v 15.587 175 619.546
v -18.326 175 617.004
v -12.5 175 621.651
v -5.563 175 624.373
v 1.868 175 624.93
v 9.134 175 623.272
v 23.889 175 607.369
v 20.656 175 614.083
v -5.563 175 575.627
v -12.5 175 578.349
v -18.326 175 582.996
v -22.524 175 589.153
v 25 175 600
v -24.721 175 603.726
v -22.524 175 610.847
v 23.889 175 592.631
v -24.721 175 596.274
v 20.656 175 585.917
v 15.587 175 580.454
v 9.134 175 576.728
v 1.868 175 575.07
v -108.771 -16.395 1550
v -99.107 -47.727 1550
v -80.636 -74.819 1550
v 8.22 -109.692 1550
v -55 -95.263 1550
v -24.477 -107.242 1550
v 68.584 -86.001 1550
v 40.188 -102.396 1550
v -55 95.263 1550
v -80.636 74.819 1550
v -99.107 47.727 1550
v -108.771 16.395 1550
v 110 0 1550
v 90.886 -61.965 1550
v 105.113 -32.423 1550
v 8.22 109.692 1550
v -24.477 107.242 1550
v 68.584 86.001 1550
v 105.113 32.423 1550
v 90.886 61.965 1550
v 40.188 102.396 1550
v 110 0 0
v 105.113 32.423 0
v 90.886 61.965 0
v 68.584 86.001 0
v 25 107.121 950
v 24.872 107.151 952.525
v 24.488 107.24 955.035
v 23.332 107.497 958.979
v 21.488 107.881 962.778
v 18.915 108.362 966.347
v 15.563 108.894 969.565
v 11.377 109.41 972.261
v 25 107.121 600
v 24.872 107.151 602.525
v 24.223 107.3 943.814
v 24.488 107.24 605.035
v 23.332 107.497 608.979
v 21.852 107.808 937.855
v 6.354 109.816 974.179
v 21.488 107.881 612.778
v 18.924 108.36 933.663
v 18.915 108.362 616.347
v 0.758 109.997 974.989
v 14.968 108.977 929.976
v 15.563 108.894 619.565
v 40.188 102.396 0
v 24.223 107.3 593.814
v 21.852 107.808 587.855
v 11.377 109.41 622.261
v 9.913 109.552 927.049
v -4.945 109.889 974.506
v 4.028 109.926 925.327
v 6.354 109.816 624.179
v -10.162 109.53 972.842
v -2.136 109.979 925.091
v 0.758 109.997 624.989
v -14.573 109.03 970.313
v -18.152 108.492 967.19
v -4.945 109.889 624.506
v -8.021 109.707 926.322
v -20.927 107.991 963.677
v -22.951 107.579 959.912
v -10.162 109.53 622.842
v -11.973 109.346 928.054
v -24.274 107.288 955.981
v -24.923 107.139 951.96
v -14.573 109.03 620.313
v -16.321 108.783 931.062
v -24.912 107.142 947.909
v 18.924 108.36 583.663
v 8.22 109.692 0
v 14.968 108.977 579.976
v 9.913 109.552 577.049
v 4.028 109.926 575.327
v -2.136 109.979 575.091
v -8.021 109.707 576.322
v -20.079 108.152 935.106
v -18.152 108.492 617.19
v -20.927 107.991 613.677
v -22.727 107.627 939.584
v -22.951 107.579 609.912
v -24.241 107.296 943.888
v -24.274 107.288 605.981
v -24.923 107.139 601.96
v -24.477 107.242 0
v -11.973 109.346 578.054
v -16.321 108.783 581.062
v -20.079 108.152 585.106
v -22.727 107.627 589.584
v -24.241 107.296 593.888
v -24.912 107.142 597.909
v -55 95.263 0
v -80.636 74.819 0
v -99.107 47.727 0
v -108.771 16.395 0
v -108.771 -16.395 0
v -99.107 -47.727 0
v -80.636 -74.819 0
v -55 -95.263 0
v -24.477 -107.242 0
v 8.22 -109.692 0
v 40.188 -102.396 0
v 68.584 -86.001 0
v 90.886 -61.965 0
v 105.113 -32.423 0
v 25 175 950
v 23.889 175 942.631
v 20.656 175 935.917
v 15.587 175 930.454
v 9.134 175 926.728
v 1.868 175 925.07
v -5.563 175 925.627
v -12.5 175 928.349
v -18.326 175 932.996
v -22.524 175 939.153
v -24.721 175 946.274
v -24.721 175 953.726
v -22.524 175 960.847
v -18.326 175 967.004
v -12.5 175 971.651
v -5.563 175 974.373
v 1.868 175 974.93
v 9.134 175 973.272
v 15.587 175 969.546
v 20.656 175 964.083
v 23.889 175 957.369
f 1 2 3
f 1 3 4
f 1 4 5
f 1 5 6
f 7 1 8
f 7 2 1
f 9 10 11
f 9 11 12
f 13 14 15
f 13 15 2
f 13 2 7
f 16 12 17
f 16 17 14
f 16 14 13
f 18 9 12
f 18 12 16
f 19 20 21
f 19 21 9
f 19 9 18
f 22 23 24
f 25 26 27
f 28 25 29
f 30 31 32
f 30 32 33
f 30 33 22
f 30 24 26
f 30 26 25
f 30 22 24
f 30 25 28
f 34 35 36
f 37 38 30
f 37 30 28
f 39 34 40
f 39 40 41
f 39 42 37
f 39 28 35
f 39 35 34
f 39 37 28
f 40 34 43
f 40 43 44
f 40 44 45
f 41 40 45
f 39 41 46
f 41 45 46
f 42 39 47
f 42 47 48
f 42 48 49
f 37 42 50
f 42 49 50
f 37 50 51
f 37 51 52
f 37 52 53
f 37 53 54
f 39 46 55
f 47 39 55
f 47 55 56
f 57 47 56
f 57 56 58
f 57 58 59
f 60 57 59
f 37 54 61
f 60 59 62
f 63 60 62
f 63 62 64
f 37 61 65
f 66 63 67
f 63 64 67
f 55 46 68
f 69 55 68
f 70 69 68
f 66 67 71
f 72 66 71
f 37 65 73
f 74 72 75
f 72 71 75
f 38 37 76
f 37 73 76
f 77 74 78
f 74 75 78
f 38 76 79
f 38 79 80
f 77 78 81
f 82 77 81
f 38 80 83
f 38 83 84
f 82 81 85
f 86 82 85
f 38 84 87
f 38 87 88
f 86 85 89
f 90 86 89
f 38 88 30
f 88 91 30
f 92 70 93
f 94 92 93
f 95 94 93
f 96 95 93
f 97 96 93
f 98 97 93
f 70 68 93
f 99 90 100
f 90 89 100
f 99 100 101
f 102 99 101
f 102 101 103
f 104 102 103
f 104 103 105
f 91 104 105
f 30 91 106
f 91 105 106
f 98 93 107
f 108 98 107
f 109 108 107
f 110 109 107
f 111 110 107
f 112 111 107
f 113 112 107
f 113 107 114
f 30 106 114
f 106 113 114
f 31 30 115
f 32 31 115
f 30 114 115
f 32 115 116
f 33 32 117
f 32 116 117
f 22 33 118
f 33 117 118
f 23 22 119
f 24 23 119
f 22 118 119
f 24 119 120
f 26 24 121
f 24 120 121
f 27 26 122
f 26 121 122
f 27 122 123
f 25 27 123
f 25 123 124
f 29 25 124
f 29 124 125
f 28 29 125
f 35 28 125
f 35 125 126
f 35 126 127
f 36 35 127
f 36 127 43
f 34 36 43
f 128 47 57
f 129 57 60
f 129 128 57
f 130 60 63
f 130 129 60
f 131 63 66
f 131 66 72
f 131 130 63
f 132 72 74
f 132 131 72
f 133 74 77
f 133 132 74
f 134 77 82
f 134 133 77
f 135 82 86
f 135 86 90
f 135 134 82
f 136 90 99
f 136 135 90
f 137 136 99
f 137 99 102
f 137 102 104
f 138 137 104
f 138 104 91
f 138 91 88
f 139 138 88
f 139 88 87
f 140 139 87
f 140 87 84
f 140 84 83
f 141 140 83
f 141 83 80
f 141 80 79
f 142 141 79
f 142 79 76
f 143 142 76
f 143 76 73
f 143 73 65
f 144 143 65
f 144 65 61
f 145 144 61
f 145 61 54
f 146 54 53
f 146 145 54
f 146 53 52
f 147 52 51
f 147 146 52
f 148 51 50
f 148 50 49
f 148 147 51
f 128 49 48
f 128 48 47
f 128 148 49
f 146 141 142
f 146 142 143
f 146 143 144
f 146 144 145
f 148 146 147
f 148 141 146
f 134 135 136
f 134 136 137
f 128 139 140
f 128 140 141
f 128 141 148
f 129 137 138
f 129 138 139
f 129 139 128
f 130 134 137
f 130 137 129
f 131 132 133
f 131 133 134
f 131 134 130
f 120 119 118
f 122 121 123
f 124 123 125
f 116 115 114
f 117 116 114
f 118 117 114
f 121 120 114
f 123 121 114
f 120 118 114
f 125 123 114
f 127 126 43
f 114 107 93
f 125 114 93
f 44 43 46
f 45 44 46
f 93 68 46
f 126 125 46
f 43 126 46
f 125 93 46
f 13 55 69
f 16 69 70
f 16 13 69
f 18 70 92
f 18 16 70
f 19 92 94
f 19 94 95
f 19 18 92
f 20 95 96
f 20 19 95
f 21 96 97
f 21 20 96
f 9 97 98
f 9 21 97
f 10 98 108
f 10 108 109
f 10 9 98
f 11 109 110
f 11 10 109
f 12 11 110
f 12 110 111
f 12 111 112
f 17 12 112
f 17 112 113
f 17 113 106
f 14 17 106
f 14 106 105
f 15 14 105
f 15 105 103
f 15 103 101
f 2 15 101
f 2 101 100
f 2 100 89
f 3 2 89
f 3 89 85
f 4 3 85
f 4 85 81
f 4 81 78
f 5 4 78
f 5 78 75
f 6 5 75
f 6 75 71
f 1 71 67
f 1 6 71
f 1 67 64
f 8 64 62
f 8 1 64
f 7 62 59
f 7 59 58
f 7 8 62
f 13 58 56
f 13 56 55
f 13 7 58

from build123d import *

# Parameters (mm, degrees)
ESBO_O1_R                = 110
RESSALTO_EXTRUS_O1_DEPTH = 1550
RESSALTO_EXTRUS_O2_REACH = 287
ESBO_O3_R                = 25


with BuildPart() as part:
    # Esboço1 → Ressalto-extrusão1 (new body)
    with BuildSketch(Plane.XY):
        Circle(ESBO_O1_R)
    extrude(amount=RESSALTO_EXTRUS_O1_DEPTH)

    # Esboço3 → Ressalto-extrusão2 (add, up to next)
    with BuildSketch(Plane(origin=(0, 175, 0), x_dir=(1, 0, 0), z_dir=(0, 1, 0)), mode=Mode.PRIVATE) as ressalto_extrus_o2_sk1:
        with Locations((0, -600)):
            Circle(ESBO_O3_R)
    ressalto_extrus_o2_tool1 = extrude(ressalto_extrus_o2_sk1.sketch, amount=-RESSALTO_EXTRUS_O2_REACH, mode=Mode.PRIVATE) - part.part
    add(ressalto_extrus_o2_tool1.solids().sort_by_distance((0, 175, 600))[0])
    # Esboço3 → Ressalto-extrusão2 (add, up to next)
    with BuildSketch(Plane(origin=(0, 175, 0), x_dir=(1, 0, 0), z_dir=(0, 1, 0)), mode=Mode.PRIVATE) as ressalto_extrus_o2_sk2:
        with Locations((0, -950)):
            Circle(ESBO_O3_R)
    ressalto_extrus_o2_tool2 = extrude(ressalto_extrus_o2_sk2.sketch, amount=-RESSALTO_EXTRUS_O2_REACH, mode=Mode.PRIVATE) - part.part
    add(ressalto_extrus_o2_tool2.solids().sort_by_distance((0, 175, 950))[0])


solid = part.part
